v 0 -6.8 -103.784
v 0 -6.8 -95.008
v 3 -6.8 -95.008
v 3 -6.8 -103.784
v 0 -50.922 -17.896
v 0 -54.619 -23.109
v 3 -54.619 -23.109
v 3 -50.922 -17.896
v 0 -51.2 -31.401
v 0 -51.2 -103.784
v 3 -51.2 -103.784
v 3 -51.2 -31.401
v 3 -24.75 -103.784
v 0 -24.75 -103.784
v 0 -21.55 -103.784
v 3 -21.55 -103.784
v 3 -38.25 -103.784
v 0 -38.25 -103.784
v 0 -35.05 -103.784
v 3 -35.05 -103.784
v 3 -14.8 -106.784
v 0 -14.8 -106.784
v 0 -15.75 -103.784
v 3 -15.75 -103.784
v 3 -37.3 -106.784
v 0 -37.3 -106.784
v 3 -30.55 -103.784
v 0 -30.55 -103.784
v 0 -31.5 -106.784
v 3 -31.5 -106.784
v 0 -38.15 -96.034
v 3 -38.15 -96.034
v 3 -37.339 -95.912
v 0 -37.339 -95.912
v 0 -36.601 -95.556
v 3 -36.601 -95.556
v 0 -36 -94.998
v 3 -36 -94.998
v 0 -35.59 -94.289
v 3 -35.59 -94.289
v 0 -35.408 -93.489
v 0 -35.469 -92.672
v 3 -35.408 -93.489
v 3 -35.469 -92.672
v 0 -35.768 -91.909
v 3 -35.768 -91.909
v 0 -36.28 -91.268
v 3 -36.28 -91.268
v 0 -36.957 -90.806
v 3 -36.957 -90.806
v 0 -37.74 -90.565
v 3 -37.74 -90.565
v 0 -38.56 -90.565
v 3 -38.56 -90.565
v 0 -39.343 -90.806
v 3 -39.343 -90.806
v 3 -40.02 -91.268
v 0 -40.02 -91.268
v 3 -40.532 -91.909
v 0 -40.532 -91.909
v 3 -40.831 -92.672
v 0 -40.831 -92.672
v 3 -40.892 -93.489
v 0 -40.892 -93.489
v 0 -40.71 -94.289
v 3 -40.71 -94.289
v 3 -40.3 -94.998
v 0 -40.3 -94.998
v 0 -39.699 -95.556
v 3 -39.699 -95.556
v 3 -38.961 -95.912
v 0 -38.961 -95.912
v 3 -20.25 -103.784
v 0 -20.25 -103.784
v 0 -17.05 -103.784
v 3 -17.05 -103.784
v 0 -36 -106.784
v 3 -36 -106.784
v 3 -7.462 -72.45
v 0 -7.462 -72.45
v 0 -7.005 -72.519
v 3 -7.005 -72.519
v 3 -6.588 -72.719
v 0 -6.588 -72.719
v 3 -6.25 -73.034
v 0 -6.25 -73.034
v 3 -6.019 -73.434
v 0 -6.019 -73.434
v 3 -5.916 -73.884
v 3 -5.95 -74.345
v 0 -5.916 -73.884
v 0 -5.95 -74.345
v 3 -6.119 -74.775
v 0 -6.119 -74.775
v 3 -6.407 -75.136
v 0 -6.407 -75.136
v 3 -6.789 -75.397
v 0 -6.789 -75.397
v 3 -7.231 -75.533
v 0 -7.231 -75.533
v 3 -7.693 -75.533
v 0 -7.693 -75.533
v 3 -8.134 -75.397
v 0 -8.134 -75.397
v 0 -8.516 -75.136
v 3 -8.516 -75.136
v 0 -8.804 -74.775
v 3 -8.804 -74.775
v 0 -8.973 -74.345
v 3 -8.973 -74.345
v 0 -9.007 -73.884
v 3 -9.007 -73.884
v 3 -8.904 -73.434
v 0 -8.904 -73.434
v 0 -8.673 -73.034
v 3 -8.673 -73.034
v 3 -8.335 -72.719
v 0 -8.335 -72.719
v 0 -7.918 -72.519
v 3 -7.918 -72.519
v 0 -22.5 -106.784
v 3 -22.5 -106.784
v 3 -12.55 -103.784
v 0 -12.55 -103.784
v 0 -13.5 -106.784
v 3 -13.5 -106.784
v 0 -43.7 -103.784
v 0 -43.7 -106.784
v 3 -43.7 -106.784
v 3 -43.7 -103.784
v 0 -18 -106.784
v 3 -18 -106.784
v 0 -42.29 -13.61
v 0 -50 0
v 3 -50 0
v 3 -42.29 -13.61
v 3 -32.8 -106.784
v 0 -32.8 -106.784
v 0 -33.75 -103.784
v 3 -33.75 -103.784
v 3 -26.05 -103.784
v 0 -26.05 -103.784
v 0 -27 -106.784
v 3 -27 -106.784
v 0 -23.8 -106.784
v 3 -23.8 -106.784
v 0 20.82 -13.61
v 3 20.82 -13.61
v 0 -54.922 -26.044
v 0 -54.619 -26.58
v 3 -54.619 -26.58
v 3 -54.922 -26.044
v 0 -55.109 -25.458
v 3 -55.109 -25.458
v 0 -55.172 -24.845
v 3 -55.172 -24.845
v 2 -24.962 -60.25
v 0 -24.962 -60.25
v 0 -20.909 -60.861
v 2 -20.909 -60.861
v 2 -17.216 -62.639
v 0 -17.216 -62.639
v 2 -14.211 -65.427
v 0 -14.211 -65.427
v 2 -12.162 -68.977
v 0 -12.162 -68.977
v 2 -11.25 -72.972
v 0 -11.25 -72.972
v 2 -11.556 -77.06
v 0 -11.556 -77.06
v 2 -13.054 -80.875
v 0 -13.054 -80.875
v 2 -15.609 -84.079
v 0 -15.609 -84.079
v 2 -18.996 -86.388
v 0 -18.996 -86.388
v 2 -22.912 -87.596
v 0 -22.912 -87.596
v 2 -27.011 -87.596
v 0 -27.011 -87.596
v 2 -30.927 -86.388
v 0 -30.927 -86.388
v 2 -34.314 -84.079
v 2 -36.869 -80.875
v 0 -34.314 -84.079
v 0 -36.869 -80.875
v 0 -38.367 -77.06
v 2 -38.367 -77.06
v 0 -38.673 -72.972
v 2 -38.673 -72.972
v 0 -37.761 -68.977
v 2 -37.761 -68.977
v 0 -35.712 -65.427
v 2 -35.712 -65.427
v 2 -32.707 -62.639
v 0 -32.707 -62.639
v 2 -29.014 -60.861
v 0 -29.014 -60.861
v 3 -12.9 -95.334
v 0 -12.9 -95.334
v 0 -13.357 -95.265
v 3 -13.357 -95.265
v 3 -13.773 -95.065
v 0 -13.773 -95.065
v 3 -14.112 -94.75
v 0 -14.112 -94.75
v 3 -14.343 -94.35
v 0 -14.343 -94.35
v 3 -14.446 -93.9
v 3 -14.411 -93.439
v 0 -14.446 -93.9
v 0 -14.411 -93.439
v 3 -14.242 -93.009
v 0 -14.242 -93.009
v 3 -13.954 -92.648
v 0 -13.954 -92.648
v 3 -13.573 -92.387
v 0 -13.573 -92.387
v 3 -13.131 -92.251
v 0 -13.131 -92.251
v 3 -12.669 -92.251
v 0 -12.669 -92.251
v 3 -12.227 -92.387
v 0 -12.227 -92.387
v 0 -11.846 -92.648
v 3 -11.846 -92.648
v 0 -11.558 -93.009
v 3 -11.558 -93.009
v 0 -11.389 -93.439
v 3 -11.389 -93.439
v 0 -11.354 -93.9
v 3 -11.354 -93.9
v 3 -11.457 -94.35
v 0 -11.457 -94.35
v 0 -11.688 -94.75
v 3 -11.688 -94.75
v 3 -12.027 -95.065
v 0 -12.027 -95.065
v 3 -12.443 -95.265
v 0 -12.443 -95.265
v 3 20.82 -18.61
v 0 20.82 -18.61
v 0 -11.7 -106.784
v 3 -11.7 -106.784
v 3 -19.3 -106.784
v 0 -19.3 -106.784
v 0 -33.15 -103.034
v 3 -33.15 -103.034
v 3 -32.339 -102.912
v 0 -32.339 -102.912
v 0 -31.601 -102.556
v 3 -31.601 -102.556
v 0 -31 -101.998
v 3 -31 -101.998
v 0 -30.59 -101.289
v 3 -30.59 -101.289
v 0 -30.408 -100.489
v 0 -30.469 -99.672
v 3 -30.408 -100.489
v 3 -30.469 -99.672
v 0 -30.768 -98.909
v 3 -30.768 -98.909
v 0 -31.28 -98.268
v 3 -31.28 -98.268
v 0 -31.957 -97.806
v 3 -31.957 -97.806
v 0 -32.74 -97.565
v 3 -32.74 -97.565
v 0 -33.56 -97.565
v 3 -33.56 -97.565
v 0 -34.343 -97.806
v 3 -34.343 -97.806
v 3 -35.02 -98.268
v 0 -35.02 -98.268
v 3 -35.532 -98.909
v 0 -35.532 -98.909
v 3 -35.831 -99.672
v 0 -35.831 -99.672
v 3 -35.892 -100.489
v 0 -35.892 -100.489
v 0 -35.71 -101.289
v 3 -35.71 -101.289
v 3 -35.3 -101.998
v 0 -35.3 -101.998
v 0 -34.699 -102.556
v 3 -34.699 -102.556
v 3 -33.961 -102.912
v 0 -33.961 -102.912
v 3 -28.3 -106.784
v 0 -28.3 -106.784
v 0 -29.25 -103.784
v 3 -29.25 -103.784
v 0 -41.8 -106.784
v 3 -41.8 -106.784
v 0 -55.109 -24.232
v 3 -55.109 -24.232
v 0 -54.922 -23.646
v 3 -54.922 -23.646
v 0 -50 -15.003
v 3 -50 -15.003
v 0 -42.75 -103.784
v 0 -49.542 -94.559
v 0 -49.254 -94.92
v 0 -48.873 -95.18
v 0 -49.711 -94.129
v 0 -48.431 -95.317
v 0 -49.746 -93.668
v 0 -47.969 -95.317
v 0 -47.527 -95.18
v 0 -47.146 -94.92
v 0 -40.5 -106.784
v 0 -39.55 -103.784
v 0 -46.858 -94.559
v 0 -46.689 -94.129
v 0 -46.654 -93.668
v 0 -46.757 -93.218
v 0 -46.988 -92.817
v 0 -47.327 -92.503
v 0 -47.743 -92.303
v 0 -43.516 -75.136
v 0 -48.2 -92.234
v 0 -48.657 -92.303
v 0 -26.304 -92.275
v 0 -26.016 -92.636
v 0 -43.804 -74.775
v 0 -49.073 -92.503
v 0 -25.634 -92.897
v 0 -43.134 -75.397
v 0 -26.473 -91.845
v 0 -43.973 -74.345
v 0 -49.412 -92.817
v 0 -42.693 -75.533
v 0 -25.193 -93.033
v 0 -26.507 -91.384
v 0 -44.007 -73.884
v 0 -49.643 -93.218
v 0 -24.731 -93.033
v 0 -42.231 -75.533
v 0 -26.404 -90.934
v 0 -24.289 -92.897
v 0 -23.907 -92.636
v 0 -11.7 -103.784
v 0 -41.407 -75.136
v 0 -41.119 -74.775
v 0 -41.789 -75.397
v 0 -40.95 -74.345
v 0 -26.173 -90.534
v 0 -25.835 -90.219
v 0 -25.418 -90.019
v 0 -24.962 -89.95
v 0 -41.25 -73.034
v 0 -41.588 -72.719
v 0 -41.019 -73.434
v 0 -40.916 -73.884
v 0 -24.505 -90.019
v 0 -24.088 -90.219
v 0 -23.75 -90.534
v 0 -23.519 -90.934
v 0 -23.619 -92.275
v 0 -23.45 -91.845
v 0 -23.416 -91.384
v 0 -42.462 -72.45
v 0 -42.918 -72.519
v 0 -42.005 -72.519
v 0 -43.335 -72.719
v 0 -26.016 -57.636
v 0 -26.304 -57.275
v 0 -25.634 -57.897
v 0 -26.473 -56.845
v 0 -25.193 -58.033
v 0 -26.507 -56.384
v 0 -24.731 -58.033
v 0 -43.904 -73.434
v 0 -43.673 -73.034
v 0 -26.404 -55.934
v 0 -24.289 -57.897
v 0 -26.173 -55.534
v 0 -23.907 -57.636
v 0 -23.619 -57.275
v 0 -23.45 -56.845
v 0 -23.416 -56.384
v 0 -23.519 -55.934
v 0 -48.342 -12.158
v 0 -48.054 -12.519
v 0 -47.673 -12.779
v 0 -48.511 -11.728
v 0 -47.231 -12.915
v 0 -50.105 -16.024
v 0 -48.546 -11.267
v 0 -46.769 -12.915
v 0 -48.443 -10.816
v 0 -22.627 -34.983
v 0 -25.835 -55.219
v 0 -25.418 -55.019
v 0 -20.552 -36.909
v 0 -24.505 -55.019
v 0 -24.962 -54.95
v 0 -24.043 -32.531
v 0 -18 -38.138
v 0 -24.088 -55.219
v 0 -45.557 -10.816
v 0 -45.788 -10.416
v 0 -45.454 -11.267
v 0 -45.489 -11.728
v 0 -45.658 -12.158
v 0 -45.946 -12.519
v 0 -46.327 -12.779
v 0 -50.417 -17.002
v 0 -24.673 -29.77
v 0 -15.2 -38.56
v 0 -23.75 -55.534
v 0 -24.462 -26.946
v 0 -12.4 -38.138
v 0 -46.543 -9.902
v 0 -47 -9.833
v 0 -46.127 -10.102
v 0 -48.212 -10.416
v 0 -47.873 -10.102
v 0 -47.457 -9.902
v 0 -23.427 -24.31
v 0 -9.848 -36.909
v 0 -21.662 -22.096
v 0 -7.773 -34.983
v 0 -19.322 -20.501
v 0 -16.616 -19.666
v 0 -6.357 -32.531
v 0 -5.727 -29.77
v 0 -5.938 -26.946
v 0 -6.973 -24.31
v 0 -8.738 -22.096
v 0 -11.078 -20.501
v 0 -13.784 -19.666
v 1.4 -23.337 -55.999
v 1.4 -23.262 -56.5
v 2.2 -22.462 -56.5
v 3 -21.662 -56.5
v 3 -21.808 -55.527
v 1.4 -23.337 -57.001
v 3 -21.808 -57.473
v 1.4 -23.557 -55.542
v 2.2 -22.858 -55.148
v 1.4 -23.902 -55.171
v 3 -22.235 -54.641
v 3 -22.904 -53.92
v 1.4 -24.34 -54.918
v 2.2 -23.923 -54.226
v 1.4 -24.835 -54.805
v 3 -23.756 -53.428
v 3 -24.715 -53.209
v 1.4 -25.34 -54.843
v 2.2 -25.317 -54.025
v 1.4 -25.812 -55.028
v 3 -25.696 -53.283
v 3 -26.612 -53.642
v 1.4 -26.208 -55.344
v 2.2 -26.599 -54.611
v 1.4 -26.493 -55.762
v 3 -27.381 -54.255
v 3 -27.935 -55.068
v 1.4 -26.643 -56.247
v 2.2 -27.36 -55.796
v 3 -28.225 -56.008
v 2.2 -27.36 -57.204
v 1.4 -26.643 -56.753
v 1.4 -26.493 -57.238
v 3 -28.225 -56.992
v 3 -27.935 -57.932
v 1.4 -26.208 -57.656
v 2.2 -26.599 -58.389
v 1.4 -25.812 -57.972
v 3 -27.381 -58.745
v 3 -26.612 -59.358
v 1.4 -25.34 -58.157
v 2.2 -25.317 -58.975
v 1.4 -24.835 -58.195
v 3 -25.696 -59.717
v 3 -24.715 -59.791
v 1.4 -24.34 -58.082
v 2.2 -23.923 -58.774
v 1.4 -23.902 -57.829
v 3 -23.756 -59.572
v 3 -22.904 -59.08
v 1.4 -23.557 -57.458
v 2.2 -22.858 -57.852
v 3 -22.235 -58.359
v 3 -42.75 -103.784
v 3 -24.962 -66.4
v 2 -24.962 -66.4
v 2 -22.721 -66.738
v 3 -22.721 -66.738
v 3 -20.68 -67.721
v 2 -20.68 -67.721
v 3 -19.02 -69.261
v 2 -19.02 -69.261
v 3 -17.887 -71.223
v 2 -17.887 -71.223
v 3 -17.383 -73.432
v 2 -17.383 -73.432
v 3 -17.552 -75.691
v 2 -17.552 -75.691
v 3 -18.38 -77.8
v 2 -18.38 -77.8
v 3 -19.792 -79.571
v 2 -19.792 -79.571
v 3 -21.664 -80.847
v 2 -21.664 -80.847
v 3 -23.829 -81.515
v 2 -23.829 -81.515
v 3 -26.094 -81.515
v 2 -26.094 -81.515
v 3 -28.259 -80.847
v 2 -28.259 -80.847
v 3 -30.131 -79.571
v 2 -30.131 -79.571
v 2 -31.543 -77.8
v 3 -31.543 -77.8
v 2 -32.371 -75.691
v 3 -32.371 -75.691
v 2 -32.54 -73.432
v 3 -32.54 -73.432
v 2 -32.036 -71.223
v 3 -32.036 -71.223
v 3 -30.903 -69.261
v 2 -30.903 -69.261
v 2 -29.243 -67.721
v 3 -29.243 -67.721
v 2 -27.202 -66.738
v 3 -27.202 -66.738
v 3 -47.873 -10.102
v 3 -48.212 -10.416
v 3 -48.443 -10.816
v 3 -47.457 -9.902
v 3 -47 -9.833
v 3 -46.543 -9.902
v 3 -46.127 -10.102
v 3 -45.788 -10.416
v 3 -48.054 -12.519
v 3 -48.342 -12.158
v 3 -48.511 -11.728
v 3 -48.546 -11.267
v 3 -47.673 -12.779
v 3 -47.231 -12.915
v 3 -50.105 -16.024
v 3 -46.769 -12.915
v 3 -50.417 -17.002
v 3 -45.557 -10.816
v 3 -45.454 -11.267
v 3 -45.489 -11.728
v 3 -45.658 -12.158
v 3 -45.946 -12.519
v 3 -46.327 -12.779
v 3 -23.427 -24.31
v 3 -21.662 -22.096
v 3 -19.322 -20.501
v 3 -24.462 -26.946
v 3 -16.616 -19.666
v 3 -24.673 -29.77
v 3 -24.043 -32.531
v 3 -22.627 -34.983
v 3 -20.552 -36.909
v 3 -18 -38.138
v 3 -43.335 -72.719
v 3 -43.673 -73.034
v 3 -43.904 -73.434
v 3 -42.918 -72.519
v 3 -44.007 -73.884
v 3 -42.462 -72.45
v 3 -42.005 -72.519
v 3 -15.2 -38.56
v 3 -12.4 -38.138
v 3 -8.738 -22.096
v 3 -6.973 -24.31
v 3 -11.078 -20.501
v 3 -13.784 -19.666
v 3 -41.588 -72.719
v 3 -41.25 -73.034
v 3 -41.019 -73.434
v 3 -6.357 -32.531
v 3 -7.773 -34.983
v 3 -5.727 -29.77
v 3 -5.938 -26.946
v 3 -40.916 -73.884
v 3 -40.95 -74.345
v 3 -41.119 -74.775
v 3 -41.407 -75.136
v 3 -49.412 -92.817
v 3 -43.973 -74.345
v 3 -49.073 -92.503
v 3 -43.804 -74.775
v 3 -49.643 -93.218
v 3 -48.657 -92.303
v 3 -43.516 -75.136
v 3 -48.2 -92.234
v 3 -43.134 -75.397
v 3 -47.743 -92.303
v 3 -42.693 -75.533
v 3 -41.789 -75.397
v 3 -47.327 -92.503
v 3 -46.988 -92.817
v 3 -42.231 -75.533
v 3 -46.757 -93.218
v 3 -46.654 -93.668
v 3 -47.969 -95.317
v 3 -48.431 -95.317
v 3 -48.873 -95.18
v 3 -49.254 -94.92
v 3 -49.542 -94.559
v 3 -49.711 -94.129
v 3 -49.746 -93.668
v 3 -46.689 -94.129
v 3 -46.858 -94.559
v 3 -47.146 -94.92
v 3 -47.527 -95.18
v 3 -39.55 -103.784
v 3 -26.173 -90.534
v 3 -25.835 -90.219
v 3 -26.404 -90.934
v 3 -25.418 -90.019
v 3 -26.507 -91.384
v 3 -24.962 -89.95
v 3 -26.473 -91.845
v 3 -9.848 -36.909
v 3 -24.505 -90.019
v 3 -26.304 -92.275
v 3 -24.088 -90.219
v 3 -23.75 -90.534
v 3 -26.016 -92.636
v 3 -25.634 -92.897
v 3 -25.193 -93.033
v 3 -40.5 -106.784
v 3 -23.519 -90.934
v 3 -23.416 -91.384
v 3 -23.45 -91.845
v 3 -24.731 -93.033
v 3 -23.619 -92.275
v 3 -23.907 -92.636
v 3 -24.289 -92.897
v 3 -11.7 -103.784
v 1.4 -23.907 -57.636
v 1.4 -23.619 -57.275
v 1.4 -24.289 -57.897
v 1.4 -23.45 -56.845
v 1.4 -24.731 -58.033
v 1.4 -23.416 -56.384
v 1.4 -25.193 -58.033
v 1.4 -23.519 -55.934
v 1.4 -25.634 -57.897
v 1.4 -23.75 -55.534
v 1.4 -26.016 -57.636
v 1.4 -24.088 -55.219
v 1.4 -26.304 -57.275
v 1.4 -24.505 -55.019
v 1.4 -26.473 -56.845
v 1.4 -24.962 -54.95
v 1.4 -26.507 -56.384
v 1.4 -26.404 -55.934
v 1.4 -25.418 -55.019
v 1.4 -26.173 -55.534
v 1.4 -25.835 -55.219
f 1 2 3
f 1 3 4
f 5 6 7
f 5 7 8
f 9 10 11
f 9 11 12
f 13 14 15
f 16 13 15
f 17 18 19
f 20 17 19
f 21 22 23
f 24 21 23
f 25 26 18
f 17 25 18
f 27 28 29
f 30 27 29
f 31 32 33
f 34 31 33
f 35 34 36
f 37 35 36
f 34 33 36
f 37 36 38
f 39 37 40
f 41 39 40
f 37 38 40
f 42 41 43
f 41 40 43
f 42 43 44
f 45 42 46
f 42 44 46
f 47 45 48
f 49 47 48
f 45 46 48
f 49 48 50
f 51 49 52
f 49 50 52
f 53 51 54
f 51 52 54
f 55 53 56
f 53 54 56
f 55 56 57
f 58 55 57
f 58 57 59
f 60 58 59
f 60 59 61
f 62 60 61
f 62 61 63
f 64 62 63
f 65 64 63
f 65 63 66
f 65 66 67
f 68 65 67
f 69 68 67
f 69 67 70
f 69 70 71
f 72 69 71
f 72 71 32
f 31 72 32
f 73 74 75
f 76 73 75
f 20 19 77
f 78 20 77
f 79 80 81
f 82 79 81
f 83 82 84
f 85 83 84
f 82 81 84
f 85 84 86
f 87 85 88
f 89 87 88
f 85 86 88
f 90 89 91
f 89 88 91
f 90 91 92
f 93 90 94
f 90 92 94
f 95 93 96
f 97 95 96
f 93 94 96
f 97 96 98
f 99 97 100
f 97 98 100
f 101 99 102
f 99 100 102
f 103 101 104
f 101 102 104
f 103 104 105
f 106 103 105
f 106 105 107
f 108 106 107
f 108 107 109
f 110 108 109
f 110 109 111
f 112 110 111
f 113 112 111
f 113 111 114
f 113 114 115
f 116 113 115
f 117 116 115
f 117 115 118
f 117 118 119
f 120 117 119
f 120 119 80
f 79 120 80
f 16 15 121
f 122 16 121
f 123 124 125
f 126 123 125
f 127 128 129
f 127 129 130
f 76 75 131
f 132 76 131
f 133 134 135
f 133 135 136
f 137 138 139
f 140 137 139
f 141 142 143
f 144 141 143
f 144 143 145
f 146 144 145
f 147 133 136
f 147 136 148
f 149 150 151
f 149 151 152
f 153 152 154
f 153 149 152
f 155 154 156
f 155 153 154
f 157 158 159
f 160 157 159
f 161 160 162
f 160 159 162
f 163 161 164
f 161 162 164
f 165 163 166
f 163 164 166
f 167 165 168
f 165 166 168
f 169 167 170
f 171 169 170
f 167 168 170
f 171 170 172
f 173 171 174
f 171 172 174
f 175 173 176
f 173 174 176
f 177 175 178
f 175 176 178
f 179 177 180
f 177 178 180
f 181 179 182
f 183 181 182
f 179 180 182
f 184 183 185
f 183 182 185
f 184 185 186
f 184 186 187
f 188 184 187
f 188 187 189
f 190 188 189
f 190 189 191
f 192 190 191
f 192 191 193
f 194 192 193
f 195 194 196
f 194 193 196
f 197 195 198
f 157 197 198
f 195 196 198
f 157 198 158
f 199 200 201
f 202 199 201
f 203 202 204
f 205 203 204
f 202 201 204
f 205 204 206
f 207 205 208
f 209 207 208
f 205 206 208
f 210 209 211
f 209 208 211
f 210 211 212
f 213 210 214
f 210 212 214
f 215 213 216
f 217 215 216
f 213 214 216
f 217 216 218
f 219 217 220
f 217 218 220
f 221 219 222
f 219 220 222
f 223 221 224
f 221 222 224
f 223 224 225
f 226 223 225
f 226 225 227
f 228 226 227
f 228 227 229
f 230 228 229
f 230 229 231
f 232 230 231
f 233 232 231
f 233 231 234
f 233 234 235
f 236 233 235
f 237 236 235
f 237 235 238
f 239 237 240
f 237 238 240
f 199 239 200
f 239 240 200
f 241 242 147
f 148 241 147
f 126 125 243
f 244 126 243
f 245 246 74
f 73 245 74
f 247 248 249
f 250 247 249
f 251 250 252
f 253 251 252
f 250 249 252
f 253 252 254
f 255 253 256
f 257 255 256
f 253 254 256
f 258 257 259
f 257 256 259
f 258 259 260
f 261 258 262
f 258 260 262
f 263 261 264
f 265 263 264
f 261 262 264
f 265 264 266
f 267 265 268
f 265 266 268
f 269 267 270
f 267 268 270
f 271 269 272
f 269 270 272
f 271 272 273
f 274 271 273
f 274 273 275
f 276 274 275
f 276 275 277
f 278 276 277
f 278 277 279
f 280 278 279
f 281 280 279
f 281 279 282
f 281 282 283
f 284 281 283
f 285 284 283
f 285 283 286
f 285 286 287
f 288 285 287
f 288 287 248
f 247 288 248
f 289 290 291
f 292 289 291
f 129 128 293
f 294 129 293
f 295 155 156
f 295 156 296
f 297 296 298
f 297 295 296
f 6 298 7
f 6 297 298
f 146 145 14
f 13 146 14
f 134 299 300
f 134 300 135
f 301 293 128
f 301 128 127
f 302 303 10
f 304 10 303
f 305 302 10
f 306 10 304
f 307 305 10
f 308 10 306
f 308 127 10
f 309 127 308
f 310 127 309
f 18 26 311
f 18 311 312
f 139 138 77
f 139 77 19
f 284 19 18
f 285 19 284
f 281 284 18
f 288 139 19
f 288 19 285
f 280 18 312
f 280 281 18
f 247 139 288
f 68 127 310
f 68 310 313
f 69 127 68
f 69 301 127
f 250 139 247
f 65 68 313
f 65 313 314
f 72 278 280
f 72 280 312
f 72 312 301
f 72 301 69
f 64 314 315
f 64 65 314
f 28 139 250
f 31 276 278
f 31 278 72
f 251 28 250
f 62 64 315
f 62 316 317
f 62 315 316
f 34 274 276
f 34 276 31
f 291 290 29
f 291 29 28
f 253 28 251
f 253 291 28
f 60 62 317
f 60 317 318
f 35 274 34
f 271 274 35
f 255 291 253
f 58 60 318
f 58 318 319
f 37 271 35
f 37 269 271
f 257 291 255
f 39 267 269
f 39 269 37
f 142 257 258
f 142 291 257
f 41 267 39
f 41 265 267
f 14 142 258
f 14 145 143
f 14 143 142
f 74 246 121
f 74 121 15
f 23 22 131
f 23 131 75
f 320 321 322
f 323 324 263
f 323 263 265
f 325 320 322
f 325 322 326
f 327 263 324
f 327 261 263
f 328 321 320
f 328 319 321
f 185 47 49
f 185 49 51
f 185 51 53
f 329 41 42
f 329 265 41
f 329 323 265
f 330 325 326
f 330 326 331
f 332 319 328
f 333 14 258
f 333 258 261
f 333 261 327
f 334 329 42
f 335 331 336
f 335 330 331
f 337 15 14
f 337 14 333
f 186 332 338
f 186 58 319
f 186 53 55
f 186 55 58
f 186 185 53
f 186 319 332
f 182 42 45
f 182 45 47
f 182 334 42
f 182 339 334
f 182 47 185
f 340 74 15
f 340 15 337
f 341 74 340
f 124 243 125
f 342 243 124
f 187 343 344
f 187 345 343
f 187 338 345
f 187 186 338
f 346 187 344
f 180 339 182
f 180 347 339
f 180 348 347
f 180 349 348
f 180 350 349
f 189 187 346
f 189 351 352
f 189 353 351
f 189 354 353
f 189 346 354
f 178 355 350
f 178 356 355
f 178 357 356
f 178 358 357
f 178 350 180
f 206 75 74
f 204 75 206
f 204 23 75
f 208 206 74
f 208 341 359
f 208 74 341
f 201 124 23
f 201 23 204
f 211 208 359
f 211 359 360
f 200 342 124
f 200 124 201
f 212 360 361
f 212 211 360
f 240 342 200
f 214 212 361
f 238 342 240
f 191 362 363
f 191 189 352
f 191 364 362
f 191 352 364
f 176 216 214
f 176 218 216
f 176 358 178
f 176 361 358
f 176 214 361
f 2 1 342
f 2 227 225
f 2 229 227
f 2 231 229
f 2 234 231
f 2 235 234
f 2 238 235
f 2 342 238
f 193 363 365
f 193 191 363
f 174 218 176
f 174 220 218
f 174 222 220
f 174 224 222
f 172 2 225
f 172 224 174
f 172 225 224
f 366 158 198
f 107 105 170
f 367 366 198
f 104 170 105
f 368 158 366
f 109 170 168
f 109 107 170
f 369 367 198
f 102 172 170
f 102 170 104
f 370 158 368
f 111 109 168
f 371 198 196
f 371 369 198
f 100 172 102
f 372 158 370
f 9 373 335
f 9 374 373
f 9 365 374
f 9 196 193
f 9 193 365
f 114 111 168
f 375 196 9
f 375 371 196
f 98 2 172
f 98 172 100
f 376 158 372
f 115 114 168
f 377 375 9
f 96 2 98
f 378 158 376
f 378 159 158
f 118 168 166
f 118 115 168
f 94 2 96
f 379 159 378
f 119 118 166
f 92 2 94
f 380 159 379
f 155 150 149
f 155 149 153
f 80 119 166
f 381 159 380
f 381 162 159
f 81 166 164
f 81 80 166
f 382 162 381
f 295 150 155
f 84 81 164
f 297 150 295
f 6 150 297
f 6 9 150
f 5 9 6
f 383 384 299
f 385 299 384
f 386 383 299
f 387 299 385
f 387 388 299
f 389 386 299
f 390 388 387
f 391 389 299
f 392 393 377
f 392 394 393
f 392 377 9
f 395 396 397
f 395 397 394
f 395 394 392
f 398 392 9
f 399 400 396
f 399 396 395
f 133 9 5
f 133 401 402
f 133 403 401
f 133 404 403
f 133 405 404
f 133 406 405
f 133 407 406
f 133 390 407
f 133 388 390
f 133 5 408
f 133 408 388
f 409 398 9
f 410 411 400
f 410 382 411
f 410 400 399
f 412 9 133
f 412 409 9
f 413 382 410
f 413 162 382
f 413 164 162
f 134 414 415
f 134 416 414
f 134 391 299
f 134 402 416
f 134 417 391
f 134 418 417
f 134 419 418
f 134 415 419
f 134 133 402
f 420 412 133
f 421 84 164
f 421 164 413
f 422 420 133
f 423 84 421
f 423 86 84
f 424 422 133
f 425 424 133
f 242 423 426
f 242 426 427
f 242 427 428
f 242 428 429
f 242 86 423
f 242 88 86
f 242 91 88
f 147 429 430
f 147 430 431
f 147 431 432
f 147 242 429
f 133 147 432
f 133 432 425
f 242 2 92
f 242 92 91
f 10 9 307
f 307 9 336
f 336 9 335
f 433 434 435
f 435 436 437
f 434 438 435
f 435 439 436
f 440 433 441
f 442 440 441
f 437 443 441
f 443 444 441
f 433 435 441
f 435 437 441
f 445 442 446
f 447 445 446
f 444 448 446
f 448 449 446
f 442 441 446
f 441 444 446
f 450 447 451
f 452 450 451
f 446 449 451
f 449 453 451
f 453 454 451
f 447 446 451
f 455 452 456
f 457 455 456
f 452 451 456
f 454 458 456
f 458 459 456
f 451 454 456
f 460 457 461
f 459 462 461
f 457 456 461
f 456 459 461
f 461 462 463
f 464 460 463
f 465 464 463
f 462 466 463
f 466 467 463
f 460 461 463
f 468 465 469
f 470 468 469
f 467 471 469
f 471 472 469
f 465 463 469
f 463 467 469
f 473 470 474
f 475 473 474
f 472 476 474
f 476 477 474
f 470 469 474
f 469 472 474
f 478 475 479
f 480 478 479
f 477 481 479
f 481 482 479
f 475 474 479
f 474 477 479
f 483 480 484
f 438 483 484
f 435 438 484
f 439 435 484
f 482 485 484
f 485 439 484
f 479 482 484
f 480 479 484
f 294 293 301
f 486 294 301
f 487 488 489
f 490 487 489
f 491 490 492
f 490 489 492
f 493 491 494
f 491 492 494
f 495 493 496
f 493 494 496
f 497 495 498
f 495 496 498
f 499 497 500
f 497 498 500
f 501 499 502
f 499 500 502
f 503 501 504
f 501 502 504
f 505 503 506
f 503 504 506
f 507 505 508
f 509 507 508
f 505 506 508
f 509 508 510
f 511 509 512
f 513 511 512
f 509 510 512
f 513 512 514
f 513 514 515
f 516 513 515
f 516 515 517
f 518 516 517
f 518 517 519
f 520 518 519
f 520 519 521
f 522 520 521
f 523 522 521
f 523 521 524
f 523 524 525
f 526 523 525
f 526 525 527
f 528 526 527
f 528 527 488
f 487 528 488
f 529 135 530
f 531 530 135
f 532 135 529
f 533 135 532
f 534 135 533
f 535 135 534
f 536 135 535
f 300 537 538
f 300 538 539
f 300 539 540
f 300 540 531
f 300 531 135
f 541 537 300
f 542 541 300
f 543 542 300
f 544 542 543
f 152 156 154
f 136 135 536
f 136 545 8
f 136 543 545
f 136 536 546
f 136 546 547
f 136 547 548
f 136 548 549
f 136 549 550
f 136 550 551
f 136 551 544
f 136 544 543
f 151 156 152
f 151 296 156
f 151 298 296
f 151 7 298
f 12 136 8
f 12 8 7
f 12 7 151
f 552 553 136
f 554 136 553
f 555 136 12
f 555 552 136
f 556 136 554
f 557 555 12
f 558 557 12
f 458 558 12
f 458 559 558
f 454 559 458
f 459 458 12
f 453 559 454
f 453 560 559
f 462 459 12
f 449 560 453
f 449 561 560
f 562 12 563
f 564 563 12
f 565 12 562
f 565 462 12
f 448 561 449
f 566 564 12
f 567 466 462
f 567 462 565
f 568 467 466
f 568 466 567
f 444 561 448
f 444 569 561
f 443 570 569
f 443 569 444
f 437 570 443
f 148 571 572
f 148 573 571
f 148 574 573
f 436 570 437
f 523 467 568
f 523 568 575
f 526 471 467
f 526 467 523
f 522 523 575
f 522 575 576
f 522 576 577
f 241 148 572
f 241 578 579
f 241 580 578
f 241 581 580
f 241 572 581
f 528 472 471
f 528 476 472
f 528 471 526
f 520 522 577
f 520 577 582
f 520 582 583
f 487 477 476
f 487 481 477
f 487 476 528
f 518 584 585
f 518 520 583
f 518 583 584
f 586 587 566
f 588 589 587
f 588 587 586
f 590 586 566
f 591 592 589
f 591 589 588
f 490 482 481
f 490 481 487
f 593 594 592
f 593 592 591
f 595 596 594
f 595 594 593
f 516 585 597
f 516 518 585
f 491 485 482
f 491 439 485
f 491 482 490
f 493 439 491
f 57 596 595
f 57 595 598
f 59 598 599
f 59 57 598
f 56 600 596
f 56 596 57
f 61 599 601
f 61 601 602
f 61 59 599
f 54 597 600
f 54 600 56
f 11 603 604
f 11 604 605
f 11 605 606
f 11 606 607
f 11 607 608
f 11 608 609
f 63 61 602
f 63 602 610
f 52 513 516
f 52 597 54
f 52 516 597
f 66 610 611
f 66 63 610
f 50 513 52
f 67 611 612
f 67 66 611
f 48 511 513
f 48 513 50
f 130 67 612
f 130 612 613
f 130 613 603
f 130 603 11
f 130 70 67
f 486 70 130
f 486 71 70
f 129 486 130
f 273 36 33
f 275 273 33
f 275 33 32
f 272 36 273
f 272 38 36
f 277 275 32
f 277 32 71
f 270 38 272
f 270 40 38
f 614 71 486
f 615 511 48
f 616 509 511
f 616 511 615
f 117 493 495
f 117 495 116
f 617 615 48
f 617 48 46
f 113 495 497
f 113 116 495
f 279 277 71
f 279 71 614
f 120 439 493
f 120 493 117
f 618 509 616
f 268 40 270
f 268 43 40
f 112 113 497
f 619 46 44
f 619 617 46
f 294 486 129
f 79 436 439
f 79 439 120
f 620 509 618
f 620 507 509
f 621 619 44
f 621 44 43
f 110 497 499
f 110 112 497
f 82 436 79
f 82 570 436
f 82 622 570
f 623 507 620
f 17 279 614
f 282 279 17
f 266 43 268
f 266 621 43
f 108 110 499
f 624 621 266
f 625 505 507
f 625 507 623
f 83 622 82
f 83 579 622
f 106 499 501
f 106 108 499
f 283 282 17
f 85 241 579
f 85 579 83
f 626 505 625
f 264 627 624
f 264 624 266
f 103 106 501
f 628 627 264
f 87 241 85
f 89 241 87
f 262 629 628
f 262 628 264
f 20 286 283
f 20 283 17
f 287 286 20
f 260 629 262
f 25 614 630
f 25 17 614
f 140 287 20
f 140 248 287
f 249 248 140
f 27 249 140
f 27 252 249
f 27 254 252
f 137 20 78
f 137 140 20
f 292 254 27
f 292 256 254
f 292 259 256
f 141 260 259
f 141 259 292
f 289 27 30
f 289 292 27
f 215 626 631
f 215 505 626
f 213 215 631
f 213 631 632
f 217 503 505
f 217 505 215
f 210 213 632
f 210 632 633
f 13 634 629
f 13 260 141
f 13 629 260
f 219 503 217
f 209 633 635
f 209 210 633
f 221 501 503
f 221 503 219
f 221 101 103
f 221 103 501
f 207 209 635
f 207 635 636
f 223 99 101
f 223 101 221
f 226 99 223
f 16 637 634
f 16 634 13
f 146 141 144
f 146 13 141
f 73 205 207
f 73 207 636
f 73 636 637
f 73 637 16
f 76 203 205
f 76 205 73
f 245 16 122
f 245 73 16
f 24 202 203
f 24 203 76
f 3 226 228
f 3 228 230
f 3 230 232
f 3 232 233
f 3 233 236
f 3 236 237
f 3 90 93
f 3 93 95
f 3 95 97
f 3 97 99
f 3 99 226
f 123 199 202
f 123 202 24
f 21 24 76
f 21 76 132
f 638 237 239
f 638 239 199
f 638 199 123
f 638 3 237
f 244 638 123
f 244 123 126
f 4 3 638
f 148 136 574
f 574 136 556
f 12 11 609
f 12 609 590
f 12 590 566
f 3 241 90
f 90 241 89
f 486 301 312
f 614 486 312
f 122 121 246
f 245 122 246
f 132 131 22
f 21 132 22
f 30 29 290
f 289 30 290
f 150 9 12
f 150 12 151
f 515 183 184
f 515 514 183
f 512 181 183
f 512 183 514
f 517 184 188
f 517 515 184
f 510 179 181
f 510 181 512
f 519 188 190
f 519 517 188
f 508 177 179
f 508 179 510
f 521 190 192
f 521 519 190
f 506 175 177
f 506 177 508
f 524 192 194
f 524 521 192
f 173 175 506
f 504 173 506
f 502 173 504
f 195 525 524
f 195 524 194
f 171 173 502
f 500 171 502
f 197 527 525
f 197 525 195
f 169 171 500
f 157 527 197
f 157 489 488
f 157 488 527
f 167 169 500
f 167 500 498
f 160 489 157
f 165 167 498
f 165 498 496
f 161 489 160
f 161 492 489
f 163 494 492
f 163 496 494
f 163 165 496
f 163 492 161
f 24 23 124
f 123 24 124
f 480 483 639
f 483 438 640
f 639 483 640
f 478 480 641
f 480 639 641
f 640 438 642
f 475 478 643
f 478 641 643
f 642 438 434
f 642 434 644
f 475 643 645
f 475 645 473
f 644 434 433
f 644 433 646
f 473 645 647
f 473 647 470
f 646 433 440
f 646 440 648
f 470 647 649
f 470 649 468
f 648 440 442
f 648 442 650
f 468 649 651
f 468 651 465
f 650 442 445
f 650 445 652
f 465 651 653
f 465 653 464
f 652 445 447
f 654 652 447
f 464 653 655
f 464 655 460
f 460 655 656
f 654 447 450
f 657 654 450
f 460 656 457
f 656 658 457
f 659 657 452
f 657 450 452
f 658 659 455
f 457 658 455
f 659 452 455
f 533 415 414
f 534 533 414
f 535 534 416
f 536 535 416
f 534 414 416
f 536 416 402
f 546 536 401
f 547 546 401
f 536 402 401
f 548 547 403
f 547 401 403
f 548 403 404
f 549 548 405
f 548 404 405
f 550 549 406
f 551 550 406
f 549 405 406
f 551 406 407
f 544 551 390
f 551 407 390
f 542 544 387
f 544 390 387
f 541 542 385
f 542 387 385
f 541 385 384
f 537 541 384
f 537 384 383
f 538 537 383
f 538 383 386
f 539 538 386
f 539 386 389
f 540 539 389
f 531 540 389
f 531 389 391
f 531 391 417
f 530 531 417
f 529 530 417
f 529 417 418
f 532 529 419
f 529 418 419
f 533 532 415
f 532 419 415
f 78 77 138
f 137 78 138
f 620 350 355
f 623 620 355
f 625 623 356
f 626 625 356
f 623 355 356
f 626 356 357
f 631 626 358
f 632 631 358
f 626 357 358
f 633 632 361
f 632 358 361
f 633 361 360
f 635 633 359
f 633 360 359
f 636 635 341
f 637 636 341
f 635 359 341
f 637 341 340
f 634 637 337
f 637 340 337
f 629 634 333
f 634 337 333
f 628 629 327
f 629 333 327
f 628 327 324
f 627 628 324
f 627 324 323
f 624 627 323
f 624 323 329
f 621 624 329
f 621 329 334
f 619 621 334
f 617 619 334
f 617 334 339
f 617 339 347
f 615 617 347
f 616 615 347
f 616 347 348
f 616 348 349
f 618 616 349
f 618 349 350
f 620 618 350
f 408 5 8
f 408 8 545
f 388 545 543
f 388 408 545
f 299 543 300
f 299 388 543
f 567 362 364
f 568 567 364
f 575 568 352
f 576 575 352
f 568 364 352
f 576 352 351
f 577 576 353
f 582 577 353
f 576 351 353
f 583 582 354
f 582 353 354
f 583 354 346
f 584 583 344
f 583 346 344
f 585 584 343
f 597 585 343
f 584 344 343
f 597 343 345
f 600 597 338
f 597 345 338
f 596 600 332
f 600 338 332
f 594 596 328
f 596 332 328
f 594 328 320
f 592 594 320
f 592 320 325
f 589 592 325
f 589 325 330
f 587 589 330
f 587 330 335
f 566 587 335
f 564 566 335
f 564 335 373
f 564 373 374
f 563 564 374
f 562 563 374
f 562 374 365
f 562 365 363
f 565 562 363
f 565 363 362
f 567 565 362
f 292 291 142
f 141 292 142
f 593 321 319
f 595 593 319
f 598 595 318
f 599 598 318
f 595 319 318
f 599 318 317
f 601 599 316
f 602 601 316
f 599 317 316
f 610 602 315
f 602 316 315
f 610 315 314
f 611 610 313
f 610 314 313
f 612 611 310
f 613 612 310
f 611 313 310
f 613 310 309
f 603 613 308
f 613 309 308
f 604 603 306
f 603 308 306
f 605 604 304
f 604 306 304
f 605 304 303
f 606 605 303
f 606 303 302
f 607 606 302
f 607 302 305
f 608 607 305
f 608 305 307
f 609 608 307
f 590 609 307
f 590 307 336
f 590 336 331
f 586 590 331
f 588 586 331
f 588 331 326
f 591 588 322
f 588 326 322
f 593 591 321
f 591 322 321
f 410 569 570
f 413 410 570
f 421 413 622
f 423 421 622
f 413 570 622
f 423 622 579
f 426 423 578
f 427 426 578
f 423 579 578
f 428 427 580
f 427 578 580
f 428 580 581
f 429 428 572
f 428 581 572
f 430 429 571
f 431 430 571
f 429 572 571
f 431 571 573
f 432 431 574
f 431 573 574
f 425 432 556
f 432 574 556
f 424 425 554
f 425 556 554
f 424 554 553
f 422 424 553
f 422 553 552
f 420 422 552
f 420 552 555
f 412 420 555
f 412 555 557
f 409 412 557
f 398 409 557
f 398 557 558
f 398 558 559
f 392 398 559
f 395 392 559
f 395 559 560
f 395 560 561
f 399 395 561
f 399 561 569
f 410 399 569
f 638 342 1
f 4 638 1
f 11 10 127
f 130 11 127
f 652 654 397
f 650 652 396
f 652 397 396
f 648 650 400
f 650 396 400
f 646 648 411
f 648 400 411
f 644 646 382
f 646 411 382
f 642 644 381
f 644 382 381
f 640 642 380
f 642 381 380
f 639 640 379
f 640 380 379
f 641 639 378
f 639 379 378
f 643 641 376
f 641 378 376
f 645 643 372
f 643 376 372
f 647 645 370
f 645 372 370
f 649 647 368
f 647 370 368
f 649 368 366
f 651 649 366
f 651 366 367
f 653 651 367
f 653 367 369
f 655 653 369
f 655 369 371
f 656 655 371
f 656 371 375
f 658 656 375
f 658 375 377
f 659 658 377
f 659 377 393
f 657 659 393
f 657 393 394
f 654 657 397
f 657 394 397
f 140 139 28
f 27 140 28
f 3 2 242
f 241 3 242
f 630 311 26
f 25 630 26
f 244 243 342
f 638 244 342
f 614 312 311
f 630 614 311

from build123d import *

# Parameters (mm, degrees)
EXTRUDE_1_DEPTH         = 3
SKETCH_3_R              = 7.6
SKETCH_3_R_2            = 9.5
SKETCH_3_R_3            = 1.55
CUT_EXTRUDE_1_DEPTH     = 112.843640856
SKETCH_4_R              = 13.75
CUT_EXTRUDE_2_DEPTH     = 2
EXTRUDE_6_DEPTH         = 3
SKETCH_10_R             = 1.55
CUT_EXTRUDE_3_DEPTH     = 124.991771172
CUT_EXTRUDE_6_DEPTH     = 124.991771172
EXTRUDE_7_DEPTH         = 3
CUT_EXTRUDE_7_DEPTH     = 124.991771172
SKETCH_18_W             = 9.7
SKETCH_18_H             = 35
CUT_EXTRUDE_9_DEPTH     = 124.991771172
SKETCH_19_R             = 1.55
CUT_EXTRUDE_10_DEPTH    = 124.991771172
SKETCH_20_W             = 61.573881036
SKETCH_20_H             = 3.2
SKETCH_20_W_2           = 79.598608315
SKETCH_20_H_2           = 1.2
EXTRUDE_8_DEPTH         = 3
EXTRUDE_START           = -3
EXTRUDE_9_DEPTH         = 3
EXTRUDE_11_DEPTH        = 3
SKETCH_25_R             = 9.5
EXTRUDE_12_DEPTH        = 3
SKETCH_26_R             = 9.5
CUT_EXTRUDE_11_DEPTH    = 124.991771172
EXTRUDE_13_DEPTH        = 3
CUT_EXTRUDE_12_DEPTH    = 3
SKETCH_29_W             = 5.5
SKETCH_29_H             = 32
EXTRUDE_14_DEPTH        = 3
SKETCH_32_W             = 9.716106013
SKETCH_32_H             = 6
CUT_EXTRUDE_13_DEPTH    = 124.991771172
CUT_EXTRUDE_16_DEPTH    = 3
SKETCH_35_W             = 2.5
SKETCH_35_H             = 44.4
EXTRUDE_15_DEPTH        = 3
SKETCH_36_R             = 1.55
CUT_EXTRUDE_14691_DEPTH = 3
EXTRUDE_16_DEPTH        = 3
SKETCH_38_R             = 2.75
CUT_EXTRUDE_L_DEPTH     = 121.232106085
SKETCH_57_R             = 1.55
EXTRUDE_17_DEPTH        = 3
CUT_EXTRUDE_17_DEPTH    = 121.232106085


# Read off the part's stored shape, not the designer's step: 高级异型孔6
with BuildPart() as part:
    # 草图1 → 凸台-拉伸1 (new body)
    with BuildSketch(Plane(origin=(0, 0, 0), x_dir=(0, 0, -1), z_dir=(1, 0, 0))):
        Polygon((0, -50), (18.610302832, -39.45792997), (18.610302832, 40), (58.496702951, 40), (58.496702951, 0), (100, 0), (100, -50), align=None)
    extrude(amount=EXTRUDE_1_DEPTH)

    # 草图3 → 切除-拉伸1 (cut, through all)
    with BuildSketch(Plane.ZY):
        with Locations((-74, -24.961577338)):
            Circle(SKETCH_3_R)
        with Locations((-34.176393222, 0)):
            Circle(SKETCH_3_R_2)
        with Locations((-74, -7.461577338)):
            Circle(SKETCH_3_R_3)
        with Locations((-56.5, -24.961577338)):
            Circle(SKETCH_3_R_3)
        with Locations((-74, -42.461577338)):
            Circle(SKETCH_3_R_3)
        with Locations((-91.5, -24.961577338)):
            Circle(SKETCH_3_R_3)
    extrude(amount=-CUT_EXTRUDE_1_DEPTH, mode=Mode.SUBTRACT)

    # 草图4 → 切除-拉伸2 (cut)
    with BuildSketch(Plane.ZY):
        with Locations((-74, -24.961577338)):
            Circle(SKETCH_4_R)
    extrude(amount=-CUT_EXTRUDE_2_DEPTH, mode=Mode.SUBTRACT)

    # 草图6 → 凸台-拉伸6 (add)
    with BuildSketch(Plane.ZY):
        with BuildLine():
            Line((-102.983893987, -45.2), (-110.983893987, -45.2))
            Line((-110.983893987, -45.2), (-111, -50))
            Line((-111, -50), (-100, -50))
            Line((-100, -50), (-100, 0))
            Line((-100, 0), (-110.983893987, 0))
            Line((-110.983893987, 0), (-110.983893987, -6.8))
            Line((-110.983893987, -6.8), (-102.983893987, -6.8))
            ThreePointArc((-102.983893987, -6.8), (-101.283893987, -8.5), (-102.983893987, -10.2))
            Line((-102.983893987, -10.2), (-110.983893987, -10.2))
            Line((-110.983893987, -10.2), (-110.983893987, -41.8))
            Line((-110.983893987, -41.8), (-102.983893987, -41.8))
            ThreePointArc((-102.983893987, -41.8), (-101.283893987, -43.5), (-102.983893987, -45.2))
        make_face()
        with BuildLine():
            Line((-15.00347976, -50), (-34.686448159, -50))
            ThreePointArc((-34.686448159, -50), (-33.16855591, -50.235967767), (-31.793933119, -50.921598751))
            Line((-31.793933119, -50.921598751), (-26.580472983, -54.619128968))
            ThreePointArc((-26.580472983, -54.619128968), (-25.755699309, -55.030507559), (-24.844963959, -55.172088219))
            ThreePointArc((-24.844963959, -55.172088219), (-23.93422861, -55.030507559), (-23.109454935, -54.619128968))
            Line((-23.109454935, -54.619128968), (-17.8959948, -50.921598751))
            ThreePointArc((-17.8959948, -50.921598751), (-16.521372009, -50.235967767), (-15.00347976, -50))
        make_face()
    extrude(amount=-EXTRUDE_6_DEPTH)

    # 草图10 → 切除-拉伸3 (cut, through all)
    with BuildSketch(Plane.ZY):
        with Locations((-105.983893987, -15.2)):
            Circle(SKETCH_10_R)
        with Locations((-105.983893987, -36.8)):
            Circle(SKETCH_10_R)
    extrude(amount=-CUT_EXTRUDE_3_DEPTH, mode=Mode.SUBTRACT)

    # 草图14 → 切除-拉伸6 (cut, through all)
    with BuildSketch(Plane(origin=(3, 0, 0), x_dir=(0, 0, -1), z_dir=(1, 0, 0))):
        with BuildLine():
            Line((58.496702951, 0), (58.496702951, 40))
            Line((58.496702951, 40), (18.610302832, 40))
            Line((18.610302832, 40), (18.610302832, 18.686206016))
            ThreePointArc((18.610302832, 18.686206016), (44.493983197, 22.023278649), (58.496702951, 0))
        make_face()
    extrude(amount=-CUT_EXTRUDE_6_DEPTH, mode=Mode.SUBTRACT)

    # 草图15 → 凸台-拉伸7 (add)
    with BuildSketch(Plane(origin=(3, 0, 0), x_dir=(0, 0, -1), z_dir=(1, 0, 0))):
        with BuildLine():
            Line((18.610302832, 18.686206016), (18.610302832, -18.686206016))
            ThreePointArc((18.610302832, -18.686206016), (9.856083494, 0), (18.610302832, 18.686206016))
        make_face()
    extrude(amount=-EXTRUDE_7_DEPTH)

    # 草图16 → 切除-拉伸7 (cut, through all)
    with BuildSketch(Plane(origin=(3, 0, 0), x_dir=(0, 0, -1), z_dir=(1, 0, 0))):
        with BuildLine():
            Line((18.610302832, -18.686206016), (18.610302832, 0))
            ThreePointArc((18.610302832, 0), (34.176393222, 15.56609039), (49.742483613, 0))
            Line((49.742483613, 0), (58.496702951, 0))
            ThreePointArc((58.496702951, 0), (23.858803248, 22.023278649), (18.610302832, -18.686206016))
        make_face()
    extrude(amount=-CUT_EXTRUDE_7_DEPTH, mode=Mode.SUBTRACT)

    # 草图18 → 切除-拉伸9 (cut, through all)
    with BuildSketch(Plane.ZY):
        with Locations((-106.133893987, -26)):
            Rectangle(SKETCH_18_W, SKETCH_18_H)
    extrude(amount=-CUT_EXTRUDE_9_DEPTH, mode=Mode.SUBTRACT)

    # 草图19 → 切除-拉伸10 (cut, through all)
    with BuildSketch(Plane.ZY):
        with Locations((-105.983893987, -1.8)):
            Circle(SKETCH_19_R)
        with Locations((-105.993932098, -48.2)):
            Circle(SKETCH_19_R)
    extrude(amount=-CUT_EXTRUDE_10_DEPTH, mode=Mode.SUBTRACT)

    # 草图20 → 凸台-拉伸8 (add)
    with BuildSketch(Plane.ZY):
        with Locations((-80.196953469, 1.6)):
            Rectangle(SKETCH_20_W, SKETCH_20_H)
        with Locations((-71.200695842, -50.6)):
            Rectangle(SKETCH_20_W_2, SKETCH_20_H_2)
    extrude(amount=-EXTRUDE_8_DEPTH)

    # 草图22 → 凸台-拉伸9 (add)
    with BuildSketch(Plane.ZY.offset(EXTRUDE_START)):
        with BuildLine():
            Line((-18.610302832, 0), (-18.610302832, 25))
            Line((-18.610302832, 25), (-41.044918155, 13.968769999))
            ThreePointArc((-41.044918155, 13.968769999), (-25.948784515, 13.213993529), (-18.610302832, 0))
        make_face()
    extrude(amount=EXTRUDE_9_DEPTH)

    # 草图24 → 凸台-拉伸11 (add)
    with BuildSketch(Plane.ZY):
        Polygon((-18.610302832, 25), (-70.983893987, 3.2), (-49.410012951, 3.2), align=None)
    extrude(amount=-EXTRUDE_11_DEPTH)

    # 草图25 → 凸台-拉伸12 (add, through all)
    with BuildSketch(Plane(origin=(3, 0, 0), x_dir=(0, 0, -1), z_dir=(1, 0, 0))):
        with Locations((34.176393222, 0)):
            Circle(SKETCH_25_R)
    extrude(amount=-EXTRUDE_12_DEPTH)

    # 草图26 → 切除-拉伸11 (cut, through all)
    with BuildSketch(Plane(origin=(3, 0, 0), x_dir=(0, 0, -1), z_dir=(1, 0, 0))):
        with Locations((29.059828781, -15.2)):
            Circle(SKETCH_26_R)
    extrude(amount=-CUT_EXTRUDE_11_DEPTH, mode=Mode.SUBTRACT)

    # 草图27 → 凸台-拉伸13 (add)
    with BuildSketch(Plane.ZY):
        Polygon((-18.610302832, -10.2), (-13.610302832, -15.2), (-18.610302832, -20.2), align=None)
    extrude(amount=-EXTRUDE_13_DEPTH)

    # 草图28 → 切除-拉伸12 (cut)
    with BuildSketch(Plane.ZY):
        Polygon((-110.983893987, 3.2), (-101.283893987, 3.2), (-70.983893987, 3.2), (-95.008477086, -6.8), (-101.283893987, -6.8), (-101.283893987, -45.2), (-110.983893987, -45.2), align=None)
    extrude(amount=-CUT_EXTRUDE_12_DEPTH, mode=Mode.SUBTRACT)

    # 草图29 → 凸台-拉伸14 (add)
    with BuildSketch(Plane.ZY):
        with Locations((-104.033893987, -27.7)):
            Rectangle(SKETCH_29_W, SKETCH_29_H)
    extrude(amount=-EXTRUDE_14_DEPTH)

    # 草图32 → 切除-拉伸13 (cut, through all)
    with BuildSketch(Plane.ZY):
        with Locations((-106.141946993, -48.2)):
            Rectangle(SKETCH_32_W, SKETCH_32_H)
    extrude(amount=-CUT_EXTRUDE_13_DEPTH, mode=Mode.SUBTRACT)

    # 草图34 → 切除-拉伸16 (cut)
    with BuildSketch(Plane.ZY):
        Polygon((-103.783893987, -15.75), (-103.783893987, -12.55), (-106.783893987, -13.5), (-106.783893987, -14.8), align=None)
        Polygon((-106.783893987, -18), (-106.783893987, -19.3), (-103.783893987, -20.25), (-103.783893987, -17.05), align=None)
        Polygon((-106.783893987, -22.5), (-106.783893987, -23.8), (-103.783893987, -24.75), (-103.783893987, -21.55), align=None)
        Polygon((-106.783893987, -27), (-106.783893987, -28.3), (-103.783893987, -29.25), (-103.783893987, -26.05), align=None)
        Polygon((-106.783893987, -31.5), (-106.783893987, -32.8), (-103.783893987, -33.75), (-103.783893987, -30.55), align=None)
        Polygon((-106.783893987, -36), (-106.783893987, -37.3), (-103.783893987, -38.25), (-103.783893987, -35.05), align=None)
        Polygon((-106.783893987, -40.5), (-106.783893987, -41.8), (-103.783893987, -42.75), (-103.783893987, -39.55), align=None)
    extrude(amount=-CUT_EXTRUDE_16_DEPTH, mode=Mode.SUBTRACT)

    # 草图35 → 凸台-拉伸15 (add, through all)
    with BuildSketch(Plane.ZY):
        with Locations((-102.533893987, -29)):
            Rectangle(SKETCH_35_W, SKETCH_35_H)
    extrude(amount=-EXTRUDE_15_DEPTH)

    # 草图36 → Cut-Extrude 14691 (cut)
    with BuildSketch(Plane.ZY):
        with Locations((-93.783893987, -48.2)):
            Circle(SKETCH_36_R)
        with Locations(Location((-93.783893987, -12.9, 0), (0, 0, 180))):
            Circle(SKETCH_36_R)
        with Locations((-21.610302832, 20.501770791)):
            Circle(SKETCH_36_R)
        with Locations((-11.382694019, -47)):
            Circle(SKETCH_36_R)
    extrude(amount=-CUT_EXTRUDE_14691_DEPTH, mode=Mode.SUBTRACT)

    # 草图37 → 凸台-拉伸16 (add)
    with BuildSketch(Plane.ZY):
        Polygon((-13.610302832, -39.45792997), (-13.610302832, -42.290250896), (-18.610302832, -39.45792997), (-18.610302832, 25), (-13.610302832, 25), align=None)
    extrude(amount=-EXTRUDE_16_DEPTH)

    # 草图38 → L型支架定位孔 (cut, through all)
    with BuildSketch(Plane(origin=(3, 0, 0), x_dir=(0, 0, -1), z_dir=(1, 0, 0))):
        with Locations((93.283893987, -38.15)):
            Circle(SKETCH_38_R)
        with Locations((100.283893987, -33.15)):
            Circle(SKETCH_38_R)
    extrude(amount=-CUT_EXTRUDE_L_DEPTH, mode=Mode.SUBTRACT)

    # 高级异型孔6 outline → 高级异型孔6 (revolve, cut)
    with BuildSketch(Plane(origin=(0, -24.961577338, -56.5), x_dir=(0, 1, 0), z_dir=(0, 0, -1))):
        Polygon((1.55, 3), (1.55, 1.4), (1.7, 1.4), (3.3, 3), align=None)
    revolve(axis=Axis((0, -24.961577338, -56.5), (1, 0, 0)), mode=Mode.SUBTRACT)

    # 草图57 → 凸台-拉伸17 (add, through all)
    with BuildSketch(Plane.ZY):
        with Locations((-21.610302832, 20.501770791)):
            Circle(SKETCH_57_R)
    extrude(amount=-EXTRUDE_17_DEPTH)

    # 草图56 → 切除-拉伸17 (cut, through all)
    with BuildSketch(Plane.ZY):
        Polygon((-95.008477086, -6.8), (-18.610302832, 20.82), (-13.610302832, 20.82), (-13.610302832, 25), (-18.610302832, 25), align=None)
    extrude(amount=-CUT_EXTRUDE_17_DEPTH, mode=Mode.SUBTRACT)


solid = part.part
